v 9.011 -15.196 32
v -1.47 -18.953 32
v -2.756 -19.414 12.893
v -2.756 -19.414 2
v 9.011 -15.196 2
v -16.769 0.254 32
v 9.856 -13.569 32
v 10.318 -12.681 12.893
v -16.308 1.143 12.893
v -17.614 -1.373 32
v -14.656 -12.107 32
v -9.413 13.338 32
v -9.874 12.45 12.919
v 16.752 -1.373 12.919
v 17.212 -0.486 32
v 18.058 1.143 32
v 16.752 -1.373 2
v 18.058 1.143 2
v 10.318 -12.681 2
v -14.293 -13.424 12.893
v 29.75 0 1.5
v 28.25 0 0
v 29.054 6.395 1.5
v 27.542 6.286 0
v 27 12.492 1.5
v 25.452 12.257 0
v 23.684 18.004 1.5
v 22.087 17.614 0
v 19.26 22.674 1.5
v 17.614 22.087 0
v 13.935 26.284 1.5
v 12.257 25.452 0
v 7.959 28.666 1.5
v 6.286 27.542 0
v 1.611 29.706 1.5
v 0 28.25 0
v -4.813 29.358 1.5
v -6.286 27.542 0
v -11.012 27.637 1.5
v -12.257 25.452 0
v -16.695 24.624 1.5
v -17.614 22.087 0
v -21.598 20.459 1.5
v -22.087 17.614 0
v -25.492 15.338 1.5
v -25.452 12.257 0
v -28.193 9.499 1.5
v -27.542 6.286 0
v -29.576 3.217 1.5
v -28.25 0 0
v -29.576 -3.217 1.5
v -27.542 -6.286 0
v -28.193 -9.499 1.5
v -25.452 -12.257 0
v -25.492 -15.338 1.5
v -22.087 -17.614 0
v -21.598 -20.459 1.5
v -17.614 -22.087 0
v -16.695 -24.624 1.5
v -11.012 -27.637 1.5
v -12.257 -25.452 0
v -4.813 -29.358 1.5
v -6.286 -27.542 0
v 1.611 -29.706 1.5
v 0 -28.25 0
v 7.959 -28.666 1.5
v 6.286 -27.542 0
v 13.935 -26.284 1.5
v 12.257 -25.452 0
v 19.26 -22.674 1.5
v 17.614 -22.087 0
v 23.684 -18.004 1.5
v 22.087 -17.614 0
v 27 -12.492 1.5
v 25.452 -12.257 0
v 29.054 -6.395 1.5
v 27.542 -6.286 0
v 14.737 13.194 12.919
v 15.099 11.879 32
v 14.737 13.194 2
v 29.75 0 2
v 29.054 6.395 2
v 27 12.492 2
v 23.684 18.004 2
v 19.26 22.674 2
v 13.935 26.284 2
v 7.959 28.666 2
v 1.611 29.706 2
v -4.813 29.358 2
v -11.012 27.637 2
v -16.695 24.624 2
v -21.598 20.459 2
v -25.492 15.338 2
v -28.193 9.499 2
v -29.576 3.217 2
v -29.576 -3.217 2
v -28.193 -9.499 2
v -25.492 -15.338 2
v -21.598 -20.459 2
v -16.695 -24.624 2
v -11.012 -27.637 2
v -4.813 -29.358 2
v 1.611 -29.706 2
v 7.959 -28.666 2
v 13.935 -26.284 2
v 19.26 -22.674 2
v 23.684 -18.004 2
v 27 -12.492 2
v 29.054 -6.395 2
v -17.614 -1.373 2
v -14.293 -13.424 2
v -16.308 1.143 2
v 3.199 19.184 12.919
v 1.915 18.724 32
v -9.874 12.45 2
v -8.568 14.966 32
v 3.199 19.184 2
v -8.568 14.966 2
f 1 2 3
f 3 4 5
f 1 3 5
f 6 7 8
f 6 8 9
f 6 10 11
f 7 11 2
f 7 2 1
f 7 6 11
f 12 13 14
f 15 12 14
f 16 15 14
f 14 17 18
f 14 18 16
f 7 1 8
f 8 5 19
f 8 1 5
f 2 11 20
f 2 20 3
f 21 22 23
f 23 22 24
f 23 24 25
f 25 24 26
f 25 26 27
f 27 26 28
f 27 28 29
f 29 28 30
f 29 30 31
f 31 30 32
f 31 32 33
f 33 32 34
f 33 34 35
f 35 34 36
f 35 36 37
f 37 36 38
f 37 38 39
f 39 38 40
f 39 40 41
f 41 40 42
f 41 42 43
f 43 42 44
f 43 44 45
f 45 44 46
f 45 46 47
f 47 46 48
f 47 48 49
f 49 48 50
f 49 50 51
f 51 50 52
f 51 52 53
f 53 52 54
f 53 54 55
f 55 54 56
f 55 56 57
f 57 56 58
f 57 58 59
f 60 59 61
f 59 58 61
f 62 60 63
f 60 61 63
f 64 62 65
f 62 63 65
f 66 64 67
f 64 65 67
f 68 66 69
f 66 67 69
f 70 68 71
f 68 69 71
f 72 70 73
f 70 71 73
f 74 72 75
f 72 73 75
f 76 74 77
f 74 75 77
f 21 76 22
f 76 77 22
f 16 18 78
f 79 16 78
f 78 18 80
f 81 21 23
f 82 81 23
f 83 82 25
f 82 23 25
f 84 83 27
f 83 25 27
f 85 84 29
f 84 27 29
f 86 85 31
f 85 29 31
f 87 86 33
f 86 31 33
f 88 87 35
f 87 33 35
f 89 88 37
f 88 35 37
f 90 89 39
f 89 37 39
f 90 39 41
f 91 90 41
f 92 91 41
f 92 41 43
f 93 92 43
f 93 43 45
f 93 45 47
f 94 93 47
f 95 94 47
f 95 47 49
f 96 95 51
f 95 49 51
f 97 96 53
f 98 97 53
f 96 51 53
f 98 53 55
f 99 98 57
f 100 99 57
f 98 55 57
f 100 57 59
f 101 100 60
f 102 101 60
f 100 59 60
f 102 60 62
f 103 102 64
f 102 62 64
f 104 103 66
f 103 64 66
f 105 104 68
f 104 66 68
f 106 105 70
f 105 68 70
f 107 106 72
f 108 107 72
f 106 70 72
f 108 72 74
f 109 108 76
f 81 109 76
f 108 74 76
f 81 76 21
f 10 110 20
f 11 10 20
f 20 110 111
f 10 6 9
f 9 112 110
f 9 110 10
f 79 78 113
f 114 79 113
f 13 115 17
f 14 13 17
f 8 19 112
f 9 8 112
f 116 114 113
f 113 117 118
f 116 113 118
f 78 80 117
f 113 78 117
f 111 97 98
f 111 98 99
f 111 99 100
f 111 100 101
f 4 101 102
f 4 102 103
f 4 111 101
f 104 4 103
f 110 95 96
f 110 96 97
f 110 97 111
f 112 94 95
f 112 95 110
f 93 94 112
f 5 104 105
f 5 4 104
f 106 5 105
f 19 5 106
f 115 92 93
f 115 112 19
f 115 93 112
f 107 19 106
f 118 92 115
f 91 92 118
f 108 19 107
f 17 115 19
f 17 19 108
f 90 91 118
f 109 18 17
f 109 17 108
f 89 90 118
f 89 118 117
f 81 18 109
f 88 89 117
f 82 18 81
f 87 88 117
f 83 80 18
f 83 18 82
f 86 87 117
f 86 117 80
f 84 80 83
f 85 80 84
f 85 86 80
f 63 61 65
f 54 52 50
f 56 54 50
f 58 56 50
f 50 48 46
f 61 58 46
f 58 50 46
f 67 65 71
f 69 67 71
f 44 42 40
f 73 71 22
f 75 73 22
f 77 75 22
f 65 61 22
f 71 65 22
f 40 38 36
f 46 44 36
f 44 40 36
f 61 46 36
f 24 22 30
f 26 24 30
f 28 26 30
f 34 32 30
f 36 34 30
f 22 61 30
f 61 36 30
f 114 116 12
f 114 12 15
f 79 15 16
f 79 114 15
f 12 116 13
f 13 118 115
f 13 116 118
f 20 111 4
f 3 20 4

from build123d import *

# Parameters (mm, degrees)
F0_R       = 29.75
F1_DEPTH   = 2
F3_DEPTH   = 30
F4_SIZE2   = 19.0811366877
F4_SIZE    = 1
F5_SIZE2   = 1.0013554388
F5_SIZE    = 19.107
F5_2_SIZE2 = 1.0013554388
F5_2_SIZE  = 19.107
F6_SIZE    = 1.5


with BuildPart() as f1:
    # F0 (on Top) → F1 (new body)
    with BuildSketch(Plane.XY):
        Circle(F0_R)
    extrude(amount=F1_DEPTH)

    # F2 (on face) → F3 (join)
    with BuildSketch(Plane.XY.offset(2)):
        Polygon((10.3176952883, -12.6805032999), (-16.307790299, 1.1427928787), (-17.614022031, -1.3731811483), (-14.2932211873, -13.4240019402), (-2.7555107662, -19.4140969509), (9.0114635564, -15.1964773269), align=None)
        Polygon((-8.5677054632, 14.9660890572), (-9.8739371952, 12.4501150302), (16.7515483921, -1.3731811483), (18.0577801241, 1.1427928787), (14.7369792805, 13.1936136705), (3.1992688593, 19.1837086812), align=None)
    extrude(amount=F3_DEPTH)

    # F4
    f4_edges = [f1.edges().sort_by_distance(p)[0] for p in [
        (3.438806, 5.538467, 32),
        (8.968124, 16.188661, 32),
    ]]
    f4_side = f1.faces().sort_by_distance((5.828725, 10.141766, 32))[0]
    chamfer(f4_edges, length=F4_SIZE, length2=F4_SIZE2, reference=f4_side)

    # F5
    f5_edges = [f1.edges().sort_by_distance(p)[0] for p in [
        (-2.995048, -5.768855, 32),
    ]]
    f5_side = f1.faces().sort_by_distance((-2.995048, -5.768855, 17))[0]
    chamfer(f5_edges, length=F5_SIZE, length2=F5_SIZE2, reference=f5_side)

    # F5#2
    f5_2_edges = [f1.edges().sort_by_distance(p)[0] for p in [
        (-8.524366, -16.419049, 32),
    ]]
    f5_2_side = f1.faces().sort_by_distance((-8.524366, -16.419049, 17))[0]
    chamfer(f5_2_edges, length=F5_2_SIZE, length2=F5_2_SIZE2, reference=f5_2_side)

    # F6
    f6_edges = [f1.edges().sort_by_distance(p)[0] for p in [
        (-29.75, 0, 0),
    ]]
    chamfer(f6_edges, length=F6_SIZE)


solid = f1.part
